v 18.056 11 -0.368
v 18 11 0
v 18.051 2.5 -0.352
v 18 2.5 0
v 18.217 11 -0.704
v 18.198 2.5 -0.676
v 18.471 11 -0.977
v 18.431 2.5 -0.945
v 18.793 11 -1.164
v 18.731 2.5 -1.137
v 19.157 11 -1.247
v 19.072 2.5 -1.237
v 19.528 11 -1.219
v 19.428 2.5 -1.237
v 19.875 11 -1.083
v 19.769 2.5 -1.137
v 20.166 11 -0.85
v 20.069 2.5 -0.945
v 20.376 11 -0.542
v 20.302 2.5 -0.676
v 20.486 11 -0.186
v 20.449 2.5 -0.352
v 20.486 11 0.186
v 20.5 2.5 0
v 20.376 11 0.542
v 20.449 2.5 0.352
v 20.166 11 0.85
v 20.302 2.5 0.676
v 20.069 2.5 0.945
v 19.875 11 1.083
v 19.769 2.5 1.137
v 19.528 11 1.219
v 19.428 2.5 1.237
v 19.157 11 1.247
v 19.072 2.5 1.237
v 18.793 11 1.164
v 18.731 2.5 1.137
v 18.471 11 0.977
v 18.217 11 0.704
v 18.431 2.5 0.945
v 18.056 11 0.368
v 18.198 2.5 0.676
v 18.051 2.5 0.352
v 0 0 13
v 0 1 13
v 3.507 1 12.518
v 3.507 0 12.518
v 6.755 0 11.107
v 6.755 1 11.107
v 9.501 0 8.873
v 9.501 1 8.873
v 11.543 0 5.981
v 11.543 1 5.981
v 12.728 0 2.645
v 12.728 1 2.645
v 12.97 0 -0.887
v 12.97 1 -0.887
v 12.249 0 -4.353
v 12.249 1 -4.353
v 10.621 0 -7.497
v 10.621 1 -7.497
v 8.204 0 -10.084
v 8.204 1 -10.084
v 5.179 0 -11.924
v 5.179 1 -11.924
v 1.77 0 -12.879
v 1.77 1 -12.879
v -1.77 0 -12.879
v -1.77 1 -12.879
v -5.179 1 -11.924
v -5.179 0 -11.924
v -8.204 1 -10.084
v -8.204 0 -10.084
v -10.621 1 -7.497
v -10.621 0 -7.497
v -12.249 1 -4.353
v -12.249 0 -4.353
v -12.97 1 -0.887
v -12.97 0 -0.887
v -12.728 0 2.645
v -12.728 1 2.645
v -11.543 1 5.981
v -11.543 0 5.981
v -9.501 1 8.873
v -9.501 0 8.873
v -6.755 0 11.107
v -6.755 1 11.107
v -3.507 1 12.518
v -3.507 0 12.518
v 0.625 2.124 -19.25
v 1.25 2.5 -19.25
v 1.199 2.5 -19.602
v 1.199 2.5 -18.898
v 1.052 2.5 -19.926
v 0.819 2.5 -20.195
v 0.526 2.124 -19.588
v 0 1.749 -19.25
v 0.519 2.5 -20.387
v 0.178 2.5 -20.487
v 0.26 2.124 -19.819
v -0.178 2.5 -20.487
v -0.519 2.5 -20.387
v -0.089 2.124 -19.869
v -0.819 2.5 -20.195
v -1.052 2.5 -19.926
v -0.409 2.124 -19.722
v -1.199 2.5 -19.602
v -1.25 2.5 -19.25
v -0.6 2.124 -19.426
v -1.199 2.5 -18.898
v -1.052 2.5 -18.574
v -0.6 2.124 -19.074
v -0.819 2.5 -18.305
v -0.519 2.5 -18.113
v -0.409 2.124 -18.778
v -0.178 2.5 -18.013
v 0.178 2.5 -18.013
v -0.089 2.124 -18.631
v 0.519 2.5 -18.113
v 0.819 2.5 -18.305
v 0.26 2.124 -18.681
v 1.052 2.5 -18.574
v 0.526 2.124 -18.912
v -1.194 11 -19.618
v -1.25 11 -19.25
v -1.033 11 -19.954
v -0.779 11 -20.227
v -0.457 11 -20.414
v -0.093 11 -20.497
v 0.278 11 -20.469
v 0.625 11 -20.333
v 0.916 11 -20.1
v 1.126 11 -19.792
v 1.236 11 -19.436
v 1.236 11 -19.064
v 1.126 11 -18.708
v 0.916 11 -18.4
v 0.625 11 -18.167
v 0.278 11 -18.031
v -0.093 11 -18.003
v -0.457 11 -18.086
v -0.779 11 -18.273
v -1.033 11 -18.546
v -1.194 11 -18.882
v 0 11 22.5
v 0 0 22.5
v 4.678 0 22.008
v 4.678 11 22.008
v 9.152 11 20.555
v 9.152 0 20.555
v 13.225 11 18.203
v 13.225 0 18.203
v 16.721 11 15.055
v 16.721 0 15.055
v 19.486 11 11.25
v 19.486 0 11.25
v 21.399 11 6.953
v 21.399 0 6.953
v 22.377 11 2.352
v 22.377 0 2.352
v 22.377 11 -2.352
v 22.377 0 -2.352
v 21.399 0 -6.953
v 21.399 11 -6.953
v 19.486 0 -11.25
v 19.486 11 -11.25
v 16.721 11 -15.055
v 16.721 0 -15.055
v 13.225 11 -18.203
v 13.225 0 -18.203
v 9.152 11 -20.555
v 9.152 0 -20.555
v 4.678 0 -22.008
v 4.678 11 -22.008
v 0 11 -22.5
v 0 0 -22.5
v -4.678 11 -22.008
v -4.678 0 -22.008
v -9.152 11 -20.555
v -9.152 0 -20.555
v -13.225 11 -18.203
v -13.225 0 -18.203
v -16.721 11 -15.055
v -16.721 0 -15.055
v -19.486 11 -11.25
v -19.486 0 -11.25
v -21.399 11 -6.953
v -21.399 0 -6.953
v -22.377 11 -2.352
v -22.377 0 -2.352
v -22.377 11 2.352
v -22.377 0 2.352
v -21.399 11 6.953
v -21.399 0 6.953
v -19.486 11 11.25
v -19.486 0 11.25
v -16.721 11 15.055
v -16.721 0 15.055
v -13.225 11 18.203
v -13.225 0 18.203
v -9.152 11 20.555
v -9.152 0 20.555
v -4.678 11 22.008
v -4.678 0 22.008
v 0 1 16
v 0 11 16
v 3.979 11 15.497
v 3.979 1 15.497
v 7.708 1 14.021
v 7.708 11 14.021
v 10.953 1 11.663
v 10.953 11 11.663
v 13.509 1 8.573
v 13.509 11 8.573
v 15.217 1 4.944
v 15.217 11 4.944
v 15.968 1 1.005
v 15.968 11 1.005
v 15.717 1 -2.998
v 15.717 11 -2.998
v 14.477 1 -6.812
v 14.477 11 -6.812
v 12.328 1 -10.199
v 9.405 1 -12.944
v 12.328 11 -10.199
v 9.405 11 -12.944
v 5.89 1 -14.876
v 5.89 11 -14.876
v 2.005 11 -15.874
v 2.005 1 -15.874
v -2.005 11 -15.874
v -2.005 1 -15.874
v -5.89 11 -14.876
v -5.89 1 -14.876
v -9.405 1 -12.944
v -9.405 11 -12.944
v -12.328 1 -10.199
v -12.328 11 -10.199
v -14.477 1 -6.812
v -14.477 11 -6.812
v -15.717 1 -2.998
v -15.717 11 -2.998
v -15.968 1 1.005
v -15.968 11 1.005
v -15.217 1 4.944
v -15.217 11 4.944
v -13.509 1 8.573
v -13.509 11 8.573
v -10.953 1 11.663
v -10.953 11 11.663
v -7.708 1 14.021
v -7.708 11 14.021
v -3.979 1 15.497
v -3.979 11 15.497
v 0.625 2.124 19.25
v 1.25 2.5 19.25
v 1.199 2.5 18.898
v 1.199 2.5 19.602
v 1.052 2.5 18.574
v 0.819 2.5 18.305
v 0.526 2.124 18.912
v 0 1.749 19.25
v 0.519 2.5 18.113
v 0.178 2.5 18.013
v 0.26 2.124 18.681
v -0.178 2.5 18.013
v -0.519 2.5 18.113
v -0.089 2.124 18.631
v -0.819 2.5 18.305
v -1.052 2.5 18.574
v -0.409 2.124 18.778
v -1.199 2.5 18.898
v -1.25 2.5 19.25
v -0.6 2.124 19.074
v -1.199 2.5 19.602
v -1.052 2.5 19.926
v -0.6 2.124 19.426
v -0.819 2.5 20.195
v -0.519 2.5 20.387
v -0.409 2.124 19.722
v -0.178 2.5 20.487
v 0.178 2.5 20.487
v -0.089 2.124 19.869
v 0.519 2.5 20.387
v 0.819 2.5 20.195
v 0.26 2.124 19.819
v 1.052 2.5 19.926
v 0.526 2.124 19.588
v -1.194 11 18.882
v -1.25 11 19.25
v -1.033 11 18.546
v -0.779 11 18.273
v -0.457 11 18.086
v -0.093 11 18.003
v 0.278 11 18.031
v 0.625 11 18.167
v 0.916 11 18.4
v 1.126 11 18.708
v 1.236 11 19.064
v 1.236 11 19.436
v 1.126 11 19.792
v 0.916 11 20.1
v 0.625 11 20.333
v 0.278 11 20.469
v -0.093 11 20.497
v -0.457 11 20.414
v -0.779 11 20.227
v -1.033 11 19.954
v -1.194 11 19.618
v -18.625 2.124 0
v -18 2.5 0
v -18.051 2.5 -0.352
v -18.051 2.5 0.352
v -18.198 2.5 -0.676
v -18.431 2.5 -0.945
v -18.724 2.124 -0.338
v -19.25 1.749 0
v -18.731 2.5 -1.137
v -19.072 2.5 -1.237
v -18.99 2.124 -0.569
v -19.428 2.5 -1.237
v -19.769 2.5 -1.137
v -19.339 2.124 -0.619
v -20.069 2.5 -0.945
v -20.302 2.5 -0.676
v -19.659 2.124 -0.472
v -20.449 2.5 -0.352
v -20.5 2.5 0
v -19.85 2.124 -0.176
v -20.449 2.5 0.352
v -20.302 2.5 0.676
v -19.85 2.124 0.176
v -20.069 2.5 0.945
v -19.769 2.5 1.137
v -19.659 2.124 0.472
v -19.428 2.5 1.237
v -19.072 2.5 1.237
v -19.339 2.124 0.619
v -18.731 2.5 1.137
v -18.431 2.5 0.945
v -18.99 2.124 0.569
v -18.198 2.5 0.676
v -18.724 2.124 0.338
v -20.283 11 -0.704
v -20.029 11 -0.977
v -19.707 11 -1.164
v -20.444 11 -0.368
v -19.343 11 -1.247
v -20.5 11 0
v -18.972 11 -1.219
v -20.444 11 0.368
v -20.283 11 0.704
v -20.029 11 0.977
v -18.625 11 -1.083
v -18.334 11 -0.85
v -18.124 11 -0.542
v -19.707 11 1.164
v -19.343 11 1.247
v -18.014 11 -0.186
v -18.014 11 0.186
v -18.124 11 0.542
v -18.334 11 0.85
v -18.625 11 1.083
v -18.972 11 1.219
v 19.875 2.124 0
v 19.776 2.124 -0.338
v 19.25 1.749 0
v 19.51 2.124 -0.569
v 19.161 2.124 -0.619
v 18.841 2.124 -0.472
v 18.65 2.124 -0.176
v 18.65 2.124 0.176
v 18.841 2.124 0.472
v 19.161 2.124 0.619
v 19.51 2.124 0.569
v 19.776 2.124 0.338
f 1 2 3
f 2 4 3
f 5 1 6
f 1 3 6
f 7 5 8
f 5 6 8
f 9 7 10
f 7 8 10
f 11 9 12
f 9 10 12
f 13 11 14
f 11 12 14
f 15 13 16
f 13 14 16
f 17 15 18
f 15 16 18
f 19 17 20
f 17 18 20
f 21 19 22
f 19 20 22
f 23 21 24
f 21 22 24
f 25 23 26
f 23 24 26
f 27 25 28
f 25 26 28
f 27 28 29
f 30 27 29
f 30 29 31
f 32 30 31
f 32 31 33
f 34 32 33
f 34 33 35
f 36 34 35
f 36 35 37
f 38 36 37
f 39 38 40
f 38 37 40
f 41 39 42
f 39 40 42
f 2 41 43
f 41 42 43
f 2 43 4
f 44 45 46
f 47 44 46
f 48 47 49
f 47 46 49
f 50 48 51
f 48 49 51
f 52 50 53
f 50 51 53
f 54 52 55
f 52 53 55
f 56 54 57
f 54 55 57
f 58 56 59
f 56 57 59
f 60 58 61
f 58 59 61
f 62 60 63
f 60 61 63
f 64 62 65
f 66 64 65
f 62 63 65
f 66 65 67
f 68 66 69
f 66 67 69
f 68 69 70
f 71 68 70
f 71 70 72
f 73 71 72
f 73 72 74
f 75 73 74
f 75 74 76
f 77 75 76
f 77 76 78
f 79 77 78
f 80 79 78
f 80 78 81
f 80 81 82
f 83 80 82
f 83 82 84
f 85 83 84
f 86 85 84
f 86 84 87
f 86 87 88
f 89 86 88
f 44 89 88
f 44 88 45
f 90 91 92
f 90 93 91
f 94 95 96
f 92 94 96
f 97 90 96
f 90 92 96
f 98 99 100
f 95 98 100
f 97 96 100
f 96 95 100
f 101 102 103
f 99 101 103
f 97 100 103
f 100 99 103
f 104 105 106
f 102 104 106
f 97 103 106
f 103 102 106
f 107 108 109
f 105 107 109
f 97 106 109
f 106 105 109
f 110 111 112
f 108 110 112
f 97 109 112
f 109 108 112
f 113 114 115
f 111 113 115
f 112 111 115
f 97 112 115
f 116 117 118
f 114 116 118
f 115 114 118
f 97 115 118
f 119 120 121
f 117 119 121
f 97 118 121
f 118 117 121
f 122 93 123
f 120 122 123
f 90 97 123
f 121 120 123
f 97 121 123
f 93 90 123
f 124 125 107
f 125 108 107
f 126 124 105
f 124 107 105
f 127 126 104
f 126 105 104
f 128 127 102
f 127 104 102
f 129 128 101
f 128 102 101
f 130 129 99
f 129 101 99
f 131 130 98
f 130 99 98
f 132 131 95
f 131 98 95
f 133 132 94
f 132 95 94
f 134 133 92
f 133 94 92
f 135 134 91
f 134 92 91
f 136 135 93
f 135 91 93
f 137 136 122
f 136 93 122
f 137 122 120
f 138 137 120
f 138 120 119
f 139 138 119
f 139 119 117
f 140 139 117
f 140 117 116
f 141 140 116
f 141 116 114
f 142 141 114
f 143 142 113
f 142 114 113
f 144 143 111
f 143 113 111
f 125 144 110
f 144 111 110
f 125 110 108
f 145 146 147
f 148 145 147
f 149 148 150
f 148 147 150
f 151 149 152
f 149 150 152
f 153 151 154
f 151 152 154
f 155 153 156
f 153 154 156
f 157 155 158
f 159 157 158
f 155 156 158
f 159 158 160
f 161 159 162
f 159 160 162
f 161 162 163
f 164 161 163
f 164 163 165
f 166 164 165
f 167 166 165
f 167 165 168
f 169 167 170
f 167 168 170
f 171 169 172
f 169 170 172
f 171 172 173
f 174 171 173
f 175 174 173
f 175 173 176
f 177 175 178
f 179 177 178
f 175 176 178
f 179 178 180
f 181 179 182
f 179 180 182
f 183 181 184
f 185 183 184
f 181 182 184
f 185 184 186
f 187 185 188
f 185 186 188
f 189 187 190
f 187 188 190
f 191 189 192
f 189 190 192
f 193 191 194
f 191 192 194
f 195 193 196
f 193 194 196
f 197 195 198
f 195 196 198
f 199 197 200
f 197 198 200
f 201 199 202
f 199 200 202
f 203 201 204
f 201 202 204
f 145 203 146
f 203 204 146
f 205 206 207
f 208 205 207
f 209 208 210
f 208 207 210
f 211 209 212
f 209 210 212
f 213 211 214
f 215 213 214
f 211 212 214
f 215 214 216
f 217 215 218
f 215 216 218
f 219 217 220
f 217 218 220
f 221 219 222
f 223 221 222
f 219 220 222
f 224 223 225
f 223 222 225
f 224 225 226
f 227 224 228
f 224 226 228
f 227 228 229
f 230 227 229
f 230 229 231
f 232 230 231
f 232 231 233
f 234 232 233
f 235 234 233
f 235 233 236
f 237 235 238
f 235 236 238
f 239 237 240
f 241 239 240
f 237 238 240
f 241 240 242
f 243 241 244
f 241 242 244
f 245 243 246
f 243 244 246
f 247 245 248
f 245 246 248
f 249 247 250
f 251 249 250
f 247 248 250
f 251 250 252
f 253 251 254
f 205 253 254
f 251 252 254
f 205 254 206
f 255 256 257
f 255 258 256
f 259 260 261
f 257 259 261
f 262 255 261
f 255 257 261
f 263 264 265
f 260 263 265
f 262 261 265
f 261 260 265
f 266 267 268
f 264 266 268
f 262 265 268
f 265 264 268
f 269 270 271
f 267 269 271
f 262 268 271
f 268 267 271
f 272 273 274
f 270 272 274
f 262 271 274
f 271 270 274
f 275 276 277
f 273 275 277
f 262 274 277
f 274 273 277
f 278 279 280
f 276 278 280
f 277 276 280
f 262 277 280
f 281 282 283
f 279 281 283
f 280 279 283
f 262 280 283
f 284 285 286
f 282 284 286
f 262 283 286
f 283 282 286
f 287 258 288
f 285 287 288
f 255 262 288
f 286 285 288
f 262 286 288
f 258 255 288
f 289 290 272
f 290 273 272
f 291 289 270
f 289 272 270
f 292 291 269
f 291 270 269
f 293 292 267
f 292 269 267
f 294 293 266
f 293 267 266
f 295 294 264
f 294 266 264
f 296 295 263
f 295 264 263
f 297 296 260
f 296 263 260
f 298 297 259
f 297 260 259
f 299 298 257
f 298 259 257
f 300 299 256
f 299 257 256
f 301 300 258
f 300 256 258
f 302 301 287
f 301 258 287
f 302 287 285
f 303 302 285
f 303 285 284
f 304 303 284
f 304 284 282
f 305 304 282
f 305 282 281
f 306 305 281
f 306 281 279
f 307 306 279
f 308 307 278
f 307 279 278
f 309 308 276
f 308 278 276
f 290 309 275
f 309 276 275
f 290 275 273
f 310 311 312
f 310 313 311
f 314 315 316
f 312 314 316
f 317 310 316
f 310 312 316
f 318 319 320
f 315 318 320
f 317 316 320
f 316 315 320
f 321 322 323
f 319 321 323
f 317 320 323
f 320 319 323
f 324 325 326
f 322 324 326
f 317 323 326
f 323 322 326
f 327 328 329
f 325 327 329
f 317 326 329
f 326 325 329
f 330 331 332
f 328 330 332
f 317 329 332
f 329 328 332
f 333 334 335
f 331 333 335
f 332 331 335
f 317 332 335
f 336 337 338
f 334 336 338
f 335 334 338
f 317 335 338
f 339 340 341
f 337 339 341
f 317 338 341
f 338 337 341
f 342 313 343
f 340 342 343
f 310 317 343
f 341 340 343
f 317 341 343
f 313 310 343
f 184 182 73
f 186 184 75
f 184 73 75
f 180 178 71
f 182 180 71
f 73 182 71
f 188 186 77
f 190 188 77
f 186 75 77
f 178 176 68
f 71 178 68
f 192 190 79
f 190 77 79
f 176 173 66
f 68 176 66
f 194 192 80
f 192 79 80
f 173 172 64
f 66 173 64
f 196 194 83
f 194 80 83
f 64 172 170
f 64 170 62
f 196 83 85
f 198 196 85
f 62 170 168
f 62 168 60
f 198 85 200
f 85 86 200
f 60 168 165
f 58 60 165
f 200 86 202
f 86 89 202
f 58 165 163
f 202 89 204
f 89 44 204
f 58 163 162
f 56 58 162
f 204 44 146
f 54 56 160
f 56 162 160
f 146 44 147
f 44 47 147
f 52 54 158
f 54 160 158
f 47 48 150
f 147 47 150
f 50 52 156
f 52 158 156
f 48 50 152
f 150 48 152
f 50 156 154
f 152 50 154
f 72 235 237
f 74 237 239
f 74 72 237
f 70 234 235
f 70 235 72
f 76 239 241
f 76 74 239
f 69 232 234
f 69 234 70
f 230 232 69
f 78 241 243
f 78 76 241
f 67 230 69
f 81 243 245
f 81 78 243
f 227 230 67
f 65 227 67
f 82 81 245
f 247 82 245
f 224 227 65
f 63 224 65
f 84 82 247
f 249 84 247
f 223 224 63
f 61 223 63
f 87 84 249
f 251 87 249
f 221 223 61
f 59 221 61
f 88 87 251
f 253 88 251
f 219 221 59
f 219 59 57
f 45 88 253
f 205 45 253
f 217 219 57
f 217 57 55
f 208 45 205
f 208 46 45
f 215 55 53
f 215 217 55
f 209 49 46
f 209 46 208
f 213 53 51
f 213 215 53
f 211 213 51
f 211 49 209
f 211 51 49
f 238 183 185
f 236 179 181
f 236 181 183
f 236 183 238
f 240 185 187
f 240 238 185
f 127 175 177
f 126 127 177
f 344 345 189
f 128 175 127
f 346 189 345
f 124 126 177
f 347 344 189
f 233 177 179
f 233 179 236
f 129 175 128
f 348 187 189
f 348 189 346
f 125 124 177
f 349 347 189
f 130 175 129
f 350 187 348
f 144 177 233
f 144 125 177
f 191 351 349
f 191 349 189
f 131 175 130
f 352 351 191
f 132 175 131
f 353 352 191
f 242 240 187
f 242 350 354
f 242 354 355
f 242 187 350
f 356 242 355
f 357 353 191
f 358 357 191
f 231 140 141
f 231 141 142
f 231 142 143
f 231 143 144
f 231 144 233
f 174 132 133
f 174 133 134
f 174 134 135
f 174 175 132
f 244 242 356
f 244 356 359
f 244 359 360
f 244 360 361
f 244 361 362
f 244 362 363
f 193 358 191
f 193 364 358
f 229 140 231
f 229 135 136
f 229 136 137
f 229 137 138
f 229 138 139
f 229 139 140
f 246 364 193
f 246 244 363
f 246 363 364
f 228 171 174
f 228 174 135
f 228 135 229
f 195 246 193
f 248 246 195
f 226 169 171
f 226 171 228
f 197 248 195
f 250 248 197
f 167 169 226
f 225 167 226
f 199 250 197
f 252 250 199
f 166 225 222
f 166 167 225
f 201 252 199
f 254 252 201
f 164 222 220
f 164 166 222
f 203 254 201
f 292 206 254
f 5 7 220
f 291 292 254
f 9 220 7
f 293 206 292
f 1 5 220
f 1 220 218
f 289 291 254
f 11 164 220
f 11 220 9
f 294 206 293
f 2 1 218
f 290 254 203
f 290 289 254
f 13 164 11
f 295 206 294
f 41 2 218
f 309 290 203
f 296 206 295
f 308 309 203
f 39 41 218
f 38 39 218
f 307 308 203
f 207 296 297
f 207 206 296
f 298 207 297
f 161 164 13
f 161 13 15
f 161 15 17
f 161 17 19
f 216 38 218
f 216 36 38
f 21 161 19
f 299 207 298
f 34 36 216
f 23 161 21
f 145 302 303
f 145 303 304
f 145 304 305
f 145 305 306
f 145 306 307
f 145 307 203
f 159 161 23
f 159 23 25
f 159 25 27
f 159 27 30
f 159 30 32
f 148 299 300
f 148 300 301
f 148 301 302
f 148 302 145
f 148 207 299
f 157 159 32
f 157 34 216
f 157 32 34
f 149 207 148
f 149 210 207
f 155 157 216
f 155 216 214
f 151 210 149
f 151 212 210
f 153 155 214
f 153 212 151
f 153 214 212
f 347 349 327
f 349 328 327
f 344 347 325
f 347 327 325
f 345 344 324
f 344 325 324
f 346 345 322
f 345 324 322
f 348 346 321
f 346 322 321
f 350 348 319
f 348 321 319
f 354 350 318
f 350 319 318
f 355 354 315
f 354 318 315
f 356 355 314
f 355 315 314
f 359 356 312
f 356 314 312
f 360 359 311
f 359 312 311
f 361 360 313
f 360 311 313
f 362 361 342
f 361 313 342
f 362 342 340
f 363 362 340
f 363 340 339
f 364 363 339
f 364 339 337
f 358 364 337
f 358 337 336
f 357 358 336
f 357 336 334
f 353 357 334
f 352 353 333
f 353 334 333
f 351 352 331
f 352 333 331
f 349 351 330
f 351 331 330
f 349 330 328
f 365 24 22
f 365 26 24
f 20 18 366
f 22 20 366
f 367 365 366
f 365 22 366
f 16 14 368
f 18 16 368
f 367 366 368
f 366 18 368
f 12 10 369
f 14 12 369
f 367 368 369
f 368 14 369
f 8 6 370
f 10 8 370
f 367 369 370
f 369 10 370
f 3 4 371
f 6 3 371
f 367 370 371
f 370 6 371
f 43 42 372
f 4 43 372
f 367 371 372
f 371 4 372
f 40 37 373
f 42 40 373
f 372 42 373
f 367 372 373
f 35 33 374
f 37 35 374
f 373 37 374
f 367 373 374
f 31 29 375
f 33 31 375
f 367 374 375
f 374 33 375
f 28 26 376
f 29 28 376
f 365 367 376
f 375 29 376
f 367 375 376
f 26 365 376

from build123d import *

# Parameters (mm, degrees)
SKETCH_1_R          = 22.5
EXTRUDE_1_DEPTH     = 11
SKETCH_2_R          = 16
CUT_EXTRUDE_1_DEPTH = 10
SKETCH_3_R          = 13
CUT_EXTRUDE_2_DEPTH = 34.35416016
M3X0_51_D           = 2.5
M3X0_51_DEPTH       = 8.5
M3X0_51_TIP         = 0.751075774


with BuildPart() as part:
    # Эскиз1 → Бобышка-Вытянуть1 (new body)
    with BuildSketch(Plane(origin=(0, 0, 0), x_dir=(1, 0, 0), z_dir=(0, 1, 0))):
        with Locations(Location((0, 0, 0), (0, 0, 270))):
            Circle(SKETCH_1_R)
    extrude(amount=EXTRUDE_1_DEPTH)

    # Эскиз2 → Вырез-Вытянуть1 (cut)
    with BuildSketch(Plane(origin=(0, 11, 0), x_dir=(1, 0, 0), z_dir=(0, 1, 0))):
        with Locations(Location((0, 0, 0), (0, 0, 270))):
            Circle(SKETCH_2_R)
    extrude(amount=-CUT_EXTRUDE_1_DEPTH, mode=Mode.SUBTRACT)

    # Эскиз3 → Вырез-Вытянуть2 (cut, through all)
    with BuildSketch(Plane(origin=(0, 1, 0), x_dir=(1, 0, 0), z_dir=(0, 1, 0))):
        with Locations(Location((0, 0, 0), (0, 0, 270))):
            Circle(SKETCH_3_R)
    extrude(amount=-CUT_EXTRUDE_2_DEPTH, mode=Mode.SUBTRACT)

    # Отверстие обработанное метчиком M3x0.51
    with Locations(Plane(origin=(0, 11, 0), x_dir=(1, 0, 0), z_dir=(0, 1, 0))):
        with Locations((-19.25, 0), (0, -19.25), (19.25, 0), (0, 19.25)):
            Hole(M3X0_51_D / 2, depth=M3X0_51_DEPTH)
            with Locations((0, 0, -(M3X0_51_DEPTH + M3X0_51_TIP / 2))):  # 118° drill point
                Cone(0, M3X0_51_D / 2, M3X0_51_TIP, mode=Mode.SUBTRACT)


solid = part.part
